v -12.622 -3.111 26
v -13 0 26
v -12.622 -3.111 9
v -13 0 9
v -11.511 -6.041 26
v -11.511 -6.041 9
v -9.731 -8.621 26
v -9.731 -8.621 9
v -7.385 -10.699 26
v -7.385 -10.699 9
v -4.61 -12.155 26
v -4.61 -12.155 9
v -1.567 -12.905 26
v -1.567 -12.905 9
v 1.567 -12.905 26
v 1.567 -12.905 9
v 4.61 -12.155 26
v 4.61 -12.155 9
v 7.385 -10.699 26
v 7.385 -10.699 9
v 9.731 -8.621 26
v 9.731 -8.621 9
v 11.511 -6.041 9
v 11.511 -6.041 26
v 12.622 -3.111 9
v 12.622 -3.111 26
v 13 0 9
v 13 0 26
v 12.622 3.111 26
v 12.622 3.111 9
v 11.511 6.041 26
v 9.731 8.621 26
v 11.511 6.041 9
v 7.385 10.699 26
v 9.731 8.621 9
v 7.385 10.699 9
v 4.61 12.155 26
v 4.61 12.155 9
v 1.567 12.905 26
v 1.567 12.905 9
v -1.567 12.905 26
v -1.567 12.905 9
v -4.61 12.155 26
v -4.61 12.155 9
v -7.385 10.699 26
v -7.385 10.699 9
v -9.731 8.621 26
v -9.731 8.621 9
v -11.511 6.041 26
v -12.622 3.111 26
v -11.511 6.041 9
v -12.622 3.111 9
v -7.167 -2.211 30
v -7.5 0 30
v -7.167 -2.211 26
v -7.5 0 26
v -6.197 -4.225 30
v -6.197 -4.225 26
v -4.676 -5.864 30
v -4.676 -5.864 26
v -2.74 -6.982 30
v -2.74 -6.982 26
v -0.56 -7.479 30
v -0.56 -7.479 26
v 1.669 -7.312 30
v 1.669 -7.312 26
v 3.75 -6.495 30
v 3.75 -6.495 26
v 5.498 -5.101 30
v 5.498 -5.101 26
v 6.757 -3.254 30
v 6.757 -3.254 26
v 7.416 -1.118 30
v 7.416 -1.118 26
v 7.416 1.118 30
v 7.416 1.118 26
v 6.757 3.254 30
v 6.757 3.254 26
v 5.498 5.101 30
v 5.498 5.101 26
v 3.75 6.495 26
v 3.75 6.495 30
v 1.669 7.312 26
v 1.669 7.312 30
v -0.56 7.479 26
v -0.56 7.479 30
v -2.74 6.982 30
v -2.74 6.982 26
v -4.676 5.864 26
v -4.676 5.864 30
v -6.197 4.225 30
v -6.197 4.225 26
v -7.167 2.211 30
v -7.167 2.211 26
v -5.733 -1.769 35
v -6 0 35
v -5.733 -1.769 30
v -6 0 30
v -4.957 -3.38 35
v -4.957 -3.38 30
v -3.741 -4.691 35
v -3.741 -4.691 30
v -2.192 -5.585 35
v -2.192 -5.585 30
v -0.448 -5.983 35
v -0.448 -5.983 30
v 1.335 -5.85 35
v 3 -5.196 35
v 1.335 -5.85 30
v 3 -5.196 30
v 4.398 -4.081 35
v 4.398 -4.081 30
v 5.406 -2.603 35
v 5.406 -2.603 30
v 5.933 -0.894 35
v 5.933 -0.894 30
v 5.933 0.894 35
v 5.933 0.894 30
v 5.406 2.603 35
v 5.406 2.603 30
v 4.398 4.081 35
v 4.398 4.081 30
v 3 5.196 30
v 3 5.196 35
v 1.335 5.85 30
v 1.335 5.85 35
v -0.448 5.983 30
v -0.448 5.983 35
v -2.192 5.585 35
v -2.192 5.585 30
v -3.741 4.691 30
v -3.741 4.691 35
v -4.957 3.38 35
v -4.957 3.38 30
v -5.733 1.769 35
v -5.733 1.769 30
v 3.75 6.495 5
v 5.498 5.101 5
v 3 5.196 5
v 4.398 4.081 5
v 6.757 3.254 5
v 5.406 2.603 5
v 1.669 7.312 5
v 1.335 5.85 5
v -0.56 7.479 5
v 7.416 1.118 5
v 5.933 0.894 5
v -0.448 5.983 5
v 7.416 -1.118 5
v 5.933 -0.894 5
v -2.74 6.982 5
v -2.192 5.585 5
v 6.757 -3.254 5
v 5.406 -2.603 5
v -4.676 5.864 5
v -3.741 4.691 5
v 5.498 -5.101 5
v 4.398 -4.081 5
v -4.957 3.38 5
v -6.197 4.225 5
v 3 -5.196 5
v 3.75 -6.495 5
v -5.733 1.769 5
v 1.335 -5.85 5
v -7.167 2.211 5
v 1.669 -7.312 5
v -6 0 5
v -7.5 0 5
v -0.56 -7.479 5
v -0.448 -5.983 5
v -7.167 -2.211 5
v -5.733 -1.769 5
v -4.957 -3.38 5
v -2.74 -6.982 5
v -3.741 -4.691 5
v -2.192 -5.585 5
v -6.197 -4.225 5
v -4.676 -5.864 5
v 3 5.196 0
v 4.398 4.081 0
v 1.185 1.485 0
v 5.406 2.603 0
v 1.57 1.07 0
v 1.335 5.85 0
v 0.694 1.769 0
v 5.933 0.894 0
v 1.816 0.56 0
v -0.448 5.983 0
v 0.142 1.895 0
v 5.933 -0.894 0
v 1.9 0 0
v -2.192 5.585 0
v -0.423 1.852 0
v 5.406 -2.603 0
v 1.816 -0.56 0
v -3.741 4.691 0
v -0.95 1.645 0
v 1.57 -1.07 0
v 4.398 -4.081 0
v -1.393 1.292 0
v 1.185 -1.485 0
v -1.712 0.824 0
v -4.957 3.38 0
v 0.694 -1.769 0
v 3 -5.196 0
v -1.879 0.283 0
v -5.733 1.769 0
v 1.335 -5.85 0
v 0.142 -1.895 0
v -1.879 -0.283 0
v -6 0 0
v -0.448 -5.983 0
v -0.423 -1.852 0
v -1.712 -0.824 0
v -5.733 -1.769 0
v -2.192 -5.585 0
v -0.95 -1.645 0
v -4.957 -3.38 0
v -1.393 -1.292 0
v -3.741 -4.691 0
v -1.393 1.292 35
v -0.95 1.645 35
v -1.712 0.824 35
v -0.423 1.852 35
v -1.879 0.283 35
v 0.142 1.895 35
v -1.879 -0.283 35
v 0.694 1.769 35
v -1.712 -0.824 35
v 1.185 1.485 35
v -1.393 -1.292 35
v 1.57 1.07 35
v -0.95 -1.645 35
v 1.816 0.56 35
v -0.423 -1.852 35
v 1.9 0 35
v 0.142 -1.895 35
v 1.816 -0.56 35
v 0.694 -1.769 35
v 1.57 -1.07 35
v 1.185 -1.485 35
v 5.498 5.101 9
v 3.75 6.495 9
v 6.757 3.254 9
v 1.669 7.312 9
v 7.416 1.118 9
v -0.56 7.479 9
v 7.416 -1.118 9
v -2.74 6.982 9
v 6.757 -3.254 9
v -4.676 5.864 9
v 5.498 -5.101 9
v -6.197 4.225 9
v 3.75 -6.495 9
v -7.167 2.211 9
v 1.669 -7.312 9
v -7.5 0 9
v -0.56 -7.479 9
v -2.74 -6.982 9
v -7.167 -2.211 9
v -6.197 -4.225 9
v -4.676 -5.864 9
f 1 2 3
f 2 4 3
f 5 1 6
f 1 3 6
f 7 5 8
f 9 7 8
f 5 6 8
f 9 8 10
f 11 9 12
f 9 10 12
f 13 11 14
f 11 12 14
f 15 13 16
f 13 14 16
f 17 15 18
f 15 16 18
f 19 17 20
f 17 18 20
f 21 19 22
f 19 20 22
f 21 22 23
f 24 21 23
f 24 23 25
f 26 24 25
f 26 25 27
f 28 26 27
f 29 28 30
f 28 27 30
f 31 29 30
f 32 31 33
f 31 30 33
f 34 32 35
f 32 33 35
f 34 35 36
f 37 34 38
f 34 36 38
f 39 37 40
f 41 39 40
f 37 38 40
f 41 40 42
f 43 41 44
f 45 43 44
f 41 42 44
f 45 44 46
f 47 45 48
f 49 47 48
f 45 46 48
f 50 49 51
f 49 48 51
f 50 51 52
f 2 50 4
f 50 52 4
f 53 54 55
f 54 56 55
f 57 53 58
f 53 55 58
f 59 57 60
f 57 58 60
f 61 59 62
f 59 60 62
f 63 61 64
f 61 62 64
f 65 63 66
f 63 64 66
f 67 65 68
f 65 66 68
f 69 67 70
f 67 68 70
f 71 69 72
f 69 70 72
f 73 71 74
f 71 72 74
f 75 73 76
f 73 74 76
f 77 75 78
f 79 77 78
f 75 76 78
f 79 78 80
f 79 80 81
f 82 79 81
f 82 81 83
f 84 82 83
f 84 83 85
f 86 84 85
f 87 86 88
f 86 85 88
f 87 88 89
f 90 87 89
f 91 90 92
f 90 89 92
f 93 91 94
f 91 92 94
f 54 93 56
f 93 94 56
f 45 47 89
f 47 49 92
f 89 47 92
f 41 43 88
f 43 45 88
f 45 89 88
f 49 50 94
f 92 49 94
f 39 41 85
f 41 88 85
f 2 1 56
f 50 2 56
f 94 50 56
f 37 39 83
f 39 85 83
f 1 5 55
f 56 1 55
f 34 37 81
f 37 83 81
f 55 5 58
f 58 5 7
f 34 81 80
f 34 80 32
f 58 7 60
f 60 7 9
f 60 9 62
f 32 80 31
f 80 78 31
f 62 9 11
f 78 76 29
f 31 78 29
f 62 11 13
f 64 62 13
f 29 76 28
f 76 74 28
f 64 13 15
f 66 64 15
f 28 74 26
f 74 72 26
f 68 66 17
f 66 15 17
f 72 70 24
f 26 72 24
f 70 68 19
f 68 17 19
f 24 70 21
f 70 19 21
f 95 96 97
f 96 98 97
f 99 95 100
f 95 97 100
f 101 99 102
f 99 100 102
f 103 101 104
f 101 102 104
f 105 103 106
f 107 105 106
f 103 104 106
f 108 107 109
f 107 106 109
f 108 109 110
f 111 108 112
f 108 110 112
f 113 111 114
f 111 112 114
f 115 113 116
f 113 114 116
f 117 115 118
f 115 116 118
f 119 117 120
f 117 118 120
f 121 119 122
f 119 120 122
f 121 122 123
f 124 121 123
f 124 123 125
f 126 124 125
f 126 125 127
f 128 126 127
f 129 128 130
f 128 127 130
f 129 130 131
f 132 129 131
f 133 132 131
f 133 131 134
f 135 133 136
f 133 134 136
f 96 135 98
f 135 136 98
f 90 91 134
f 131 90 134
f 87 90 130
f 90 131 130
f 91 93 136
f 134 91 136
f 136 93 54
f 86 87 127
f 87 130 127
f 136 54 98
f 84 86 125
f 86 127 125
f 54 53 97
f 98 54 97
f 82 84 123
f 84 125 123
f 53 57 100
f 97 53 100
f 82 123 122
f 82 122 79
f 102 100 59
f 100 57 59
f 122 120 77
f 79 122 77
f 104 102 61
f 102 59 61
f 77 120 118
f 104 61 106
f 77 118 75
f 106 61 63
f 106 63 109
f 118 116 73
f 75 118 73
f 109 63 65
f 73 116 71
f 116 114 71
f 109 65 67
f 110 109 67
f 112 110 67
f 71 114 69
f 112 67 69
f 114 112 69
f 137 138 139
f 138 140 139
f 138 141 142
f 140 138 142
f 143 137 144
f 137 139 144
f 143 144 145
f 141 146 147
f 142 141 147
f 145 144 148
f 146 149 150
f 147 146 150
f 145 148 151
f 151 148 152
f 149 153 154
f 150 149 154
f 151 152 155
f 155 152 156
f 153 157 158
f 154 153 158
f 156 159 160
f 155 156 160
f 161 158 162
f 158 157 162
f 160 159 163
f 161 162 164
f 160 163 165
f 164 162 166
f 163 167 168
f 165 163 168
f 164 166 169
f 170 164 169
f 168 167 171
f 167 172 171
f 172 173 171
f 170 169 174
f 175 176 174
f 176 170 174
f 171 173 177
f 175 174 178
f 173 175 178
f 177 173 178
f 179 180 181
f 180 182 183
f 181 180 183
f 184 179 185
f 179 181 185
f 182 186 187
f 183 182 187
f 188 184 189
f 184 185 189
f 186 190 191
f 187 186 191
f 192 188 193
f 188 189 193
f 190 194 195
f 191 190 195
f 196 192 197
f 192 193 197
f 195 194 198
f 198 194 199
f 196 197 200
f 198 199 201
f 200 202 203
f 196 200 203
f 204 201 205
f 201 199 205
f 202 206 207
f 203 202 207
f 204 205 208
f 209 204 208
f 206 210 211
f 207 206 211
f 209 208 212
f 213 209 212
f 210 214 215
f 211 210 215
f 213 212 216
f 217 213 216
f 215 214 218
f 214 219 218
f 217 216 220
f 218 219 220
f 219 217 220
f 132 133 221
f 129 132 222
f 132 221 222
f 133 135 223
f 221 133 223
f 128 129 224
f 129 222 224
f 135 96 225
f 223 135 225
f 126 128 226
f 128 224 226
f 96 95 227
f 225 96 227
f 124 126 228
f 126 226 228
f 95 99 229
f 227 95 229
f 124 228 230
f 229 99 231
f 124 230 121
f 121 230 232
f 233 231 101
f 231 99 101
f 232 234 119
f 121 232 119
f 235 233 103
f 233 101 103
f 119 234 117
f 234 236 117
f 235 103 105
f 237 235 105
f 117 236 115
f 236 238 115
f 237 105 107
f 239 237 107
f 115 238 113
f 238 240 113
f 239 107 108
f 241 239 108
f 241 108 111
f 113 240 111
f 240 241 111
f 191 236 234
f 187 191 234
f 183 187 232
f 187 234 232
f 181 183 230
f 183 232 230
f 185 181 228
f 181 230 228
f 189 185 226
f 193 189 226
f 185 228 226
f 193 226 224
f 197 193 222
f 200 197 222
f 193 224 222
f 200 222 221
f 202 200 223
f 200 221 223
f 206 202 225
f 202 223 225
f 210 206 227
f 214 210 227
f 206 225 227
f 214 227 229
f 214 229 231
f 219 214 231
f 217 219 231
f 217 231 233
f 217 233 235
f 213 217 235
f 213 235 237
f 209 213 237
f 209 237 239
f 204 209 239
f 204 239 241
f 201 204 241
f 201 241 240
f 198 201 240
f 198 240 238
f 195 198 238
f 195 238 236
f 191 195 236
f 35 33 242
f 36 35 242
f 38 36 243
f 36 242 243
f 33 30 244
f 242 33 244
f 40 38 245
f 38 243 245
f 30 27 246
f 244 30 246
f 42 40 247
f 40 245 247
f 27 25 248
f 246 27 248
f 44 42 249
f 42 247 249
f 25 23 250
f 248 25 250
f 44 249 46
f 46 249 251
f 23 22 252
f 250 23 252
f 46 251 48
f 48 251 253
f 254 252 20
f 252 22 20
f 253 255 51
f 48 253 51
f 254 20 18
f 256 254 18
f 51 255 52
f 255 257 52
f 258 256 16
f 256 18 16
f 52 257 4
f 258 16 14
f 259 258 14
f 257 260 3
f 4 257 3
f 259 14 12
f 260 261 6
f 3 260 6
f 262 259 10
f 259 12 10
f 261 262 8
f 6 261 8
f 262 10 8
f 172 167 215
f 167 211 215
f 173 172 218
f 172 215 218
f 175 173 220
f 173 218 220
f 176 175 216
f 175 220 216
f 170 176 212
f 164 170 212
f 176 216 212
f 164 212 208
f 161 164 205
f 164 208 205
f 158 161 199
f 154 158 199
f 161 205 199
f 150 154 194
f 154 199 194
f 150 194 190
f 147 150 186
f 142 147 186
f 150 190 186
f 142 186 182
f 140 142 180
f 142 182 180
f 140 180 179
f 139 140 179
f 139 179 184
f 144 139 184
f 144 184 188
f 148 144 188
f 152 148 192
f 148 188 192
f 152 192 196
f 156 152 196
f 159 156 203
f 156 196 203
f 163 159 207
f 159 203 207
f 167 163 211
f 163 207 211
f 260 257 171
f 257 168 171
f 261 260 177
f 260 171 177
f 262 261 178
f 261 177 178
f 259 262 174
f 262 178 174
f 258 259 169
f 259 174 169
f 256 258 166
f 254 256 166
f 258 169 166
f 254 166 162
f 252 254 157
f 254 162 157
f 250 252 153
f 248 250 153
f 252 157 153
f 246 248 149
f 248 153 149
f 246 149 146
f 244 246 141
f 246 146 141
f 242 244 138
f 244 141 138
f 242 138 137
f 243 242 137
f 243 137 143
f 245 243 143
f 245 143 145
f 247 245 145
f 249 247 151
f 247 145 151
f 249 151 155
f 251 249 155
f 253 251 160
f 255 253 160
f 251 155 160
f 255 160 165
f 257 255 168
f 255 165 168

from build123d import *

# Parameters (mm, degrees)
SKETCH_2_R          = 1.9
CUT_EXTRUDE_1_DEPTH = 36


with BuildPart() as part:
    # 草图1 → 旋转1 (revolve)
    with BuildSketch(Plane(origin=(0, 0, 0), x_dir=(1, 0, 0), z_dir=(0, 1, 0)), mode=Mode.PRIVATE) as revolve_1_sk:
        Polygon((0, -1e-09), (0, -35), (6, -35), (6, -30), (7.5, -30), (7.5, -26), (9, -26), (13, -26), (13, -9), (9, -9), (7.5, -9), (7.5, -5), (6, -5), (6, -1e-09), align=None)
    revolve(revolve_1_sk.sketch.rotate(Axis((0, 0, 1e-09), (0, 0, 1)), 180), axis=Axis((0, 0, 1e-09), (0, 0, 1)))

    # 草图2 → 切除-拉伸1 (cut)
    with BuildSketch(Plane.XY.offset(35)):
        Circle(SKETCH_2_R)
    extrude(amount=-CUT_EXTRUDE_1_DEPTH, mode=Mode.SUBTRACT)


solid = part.part
